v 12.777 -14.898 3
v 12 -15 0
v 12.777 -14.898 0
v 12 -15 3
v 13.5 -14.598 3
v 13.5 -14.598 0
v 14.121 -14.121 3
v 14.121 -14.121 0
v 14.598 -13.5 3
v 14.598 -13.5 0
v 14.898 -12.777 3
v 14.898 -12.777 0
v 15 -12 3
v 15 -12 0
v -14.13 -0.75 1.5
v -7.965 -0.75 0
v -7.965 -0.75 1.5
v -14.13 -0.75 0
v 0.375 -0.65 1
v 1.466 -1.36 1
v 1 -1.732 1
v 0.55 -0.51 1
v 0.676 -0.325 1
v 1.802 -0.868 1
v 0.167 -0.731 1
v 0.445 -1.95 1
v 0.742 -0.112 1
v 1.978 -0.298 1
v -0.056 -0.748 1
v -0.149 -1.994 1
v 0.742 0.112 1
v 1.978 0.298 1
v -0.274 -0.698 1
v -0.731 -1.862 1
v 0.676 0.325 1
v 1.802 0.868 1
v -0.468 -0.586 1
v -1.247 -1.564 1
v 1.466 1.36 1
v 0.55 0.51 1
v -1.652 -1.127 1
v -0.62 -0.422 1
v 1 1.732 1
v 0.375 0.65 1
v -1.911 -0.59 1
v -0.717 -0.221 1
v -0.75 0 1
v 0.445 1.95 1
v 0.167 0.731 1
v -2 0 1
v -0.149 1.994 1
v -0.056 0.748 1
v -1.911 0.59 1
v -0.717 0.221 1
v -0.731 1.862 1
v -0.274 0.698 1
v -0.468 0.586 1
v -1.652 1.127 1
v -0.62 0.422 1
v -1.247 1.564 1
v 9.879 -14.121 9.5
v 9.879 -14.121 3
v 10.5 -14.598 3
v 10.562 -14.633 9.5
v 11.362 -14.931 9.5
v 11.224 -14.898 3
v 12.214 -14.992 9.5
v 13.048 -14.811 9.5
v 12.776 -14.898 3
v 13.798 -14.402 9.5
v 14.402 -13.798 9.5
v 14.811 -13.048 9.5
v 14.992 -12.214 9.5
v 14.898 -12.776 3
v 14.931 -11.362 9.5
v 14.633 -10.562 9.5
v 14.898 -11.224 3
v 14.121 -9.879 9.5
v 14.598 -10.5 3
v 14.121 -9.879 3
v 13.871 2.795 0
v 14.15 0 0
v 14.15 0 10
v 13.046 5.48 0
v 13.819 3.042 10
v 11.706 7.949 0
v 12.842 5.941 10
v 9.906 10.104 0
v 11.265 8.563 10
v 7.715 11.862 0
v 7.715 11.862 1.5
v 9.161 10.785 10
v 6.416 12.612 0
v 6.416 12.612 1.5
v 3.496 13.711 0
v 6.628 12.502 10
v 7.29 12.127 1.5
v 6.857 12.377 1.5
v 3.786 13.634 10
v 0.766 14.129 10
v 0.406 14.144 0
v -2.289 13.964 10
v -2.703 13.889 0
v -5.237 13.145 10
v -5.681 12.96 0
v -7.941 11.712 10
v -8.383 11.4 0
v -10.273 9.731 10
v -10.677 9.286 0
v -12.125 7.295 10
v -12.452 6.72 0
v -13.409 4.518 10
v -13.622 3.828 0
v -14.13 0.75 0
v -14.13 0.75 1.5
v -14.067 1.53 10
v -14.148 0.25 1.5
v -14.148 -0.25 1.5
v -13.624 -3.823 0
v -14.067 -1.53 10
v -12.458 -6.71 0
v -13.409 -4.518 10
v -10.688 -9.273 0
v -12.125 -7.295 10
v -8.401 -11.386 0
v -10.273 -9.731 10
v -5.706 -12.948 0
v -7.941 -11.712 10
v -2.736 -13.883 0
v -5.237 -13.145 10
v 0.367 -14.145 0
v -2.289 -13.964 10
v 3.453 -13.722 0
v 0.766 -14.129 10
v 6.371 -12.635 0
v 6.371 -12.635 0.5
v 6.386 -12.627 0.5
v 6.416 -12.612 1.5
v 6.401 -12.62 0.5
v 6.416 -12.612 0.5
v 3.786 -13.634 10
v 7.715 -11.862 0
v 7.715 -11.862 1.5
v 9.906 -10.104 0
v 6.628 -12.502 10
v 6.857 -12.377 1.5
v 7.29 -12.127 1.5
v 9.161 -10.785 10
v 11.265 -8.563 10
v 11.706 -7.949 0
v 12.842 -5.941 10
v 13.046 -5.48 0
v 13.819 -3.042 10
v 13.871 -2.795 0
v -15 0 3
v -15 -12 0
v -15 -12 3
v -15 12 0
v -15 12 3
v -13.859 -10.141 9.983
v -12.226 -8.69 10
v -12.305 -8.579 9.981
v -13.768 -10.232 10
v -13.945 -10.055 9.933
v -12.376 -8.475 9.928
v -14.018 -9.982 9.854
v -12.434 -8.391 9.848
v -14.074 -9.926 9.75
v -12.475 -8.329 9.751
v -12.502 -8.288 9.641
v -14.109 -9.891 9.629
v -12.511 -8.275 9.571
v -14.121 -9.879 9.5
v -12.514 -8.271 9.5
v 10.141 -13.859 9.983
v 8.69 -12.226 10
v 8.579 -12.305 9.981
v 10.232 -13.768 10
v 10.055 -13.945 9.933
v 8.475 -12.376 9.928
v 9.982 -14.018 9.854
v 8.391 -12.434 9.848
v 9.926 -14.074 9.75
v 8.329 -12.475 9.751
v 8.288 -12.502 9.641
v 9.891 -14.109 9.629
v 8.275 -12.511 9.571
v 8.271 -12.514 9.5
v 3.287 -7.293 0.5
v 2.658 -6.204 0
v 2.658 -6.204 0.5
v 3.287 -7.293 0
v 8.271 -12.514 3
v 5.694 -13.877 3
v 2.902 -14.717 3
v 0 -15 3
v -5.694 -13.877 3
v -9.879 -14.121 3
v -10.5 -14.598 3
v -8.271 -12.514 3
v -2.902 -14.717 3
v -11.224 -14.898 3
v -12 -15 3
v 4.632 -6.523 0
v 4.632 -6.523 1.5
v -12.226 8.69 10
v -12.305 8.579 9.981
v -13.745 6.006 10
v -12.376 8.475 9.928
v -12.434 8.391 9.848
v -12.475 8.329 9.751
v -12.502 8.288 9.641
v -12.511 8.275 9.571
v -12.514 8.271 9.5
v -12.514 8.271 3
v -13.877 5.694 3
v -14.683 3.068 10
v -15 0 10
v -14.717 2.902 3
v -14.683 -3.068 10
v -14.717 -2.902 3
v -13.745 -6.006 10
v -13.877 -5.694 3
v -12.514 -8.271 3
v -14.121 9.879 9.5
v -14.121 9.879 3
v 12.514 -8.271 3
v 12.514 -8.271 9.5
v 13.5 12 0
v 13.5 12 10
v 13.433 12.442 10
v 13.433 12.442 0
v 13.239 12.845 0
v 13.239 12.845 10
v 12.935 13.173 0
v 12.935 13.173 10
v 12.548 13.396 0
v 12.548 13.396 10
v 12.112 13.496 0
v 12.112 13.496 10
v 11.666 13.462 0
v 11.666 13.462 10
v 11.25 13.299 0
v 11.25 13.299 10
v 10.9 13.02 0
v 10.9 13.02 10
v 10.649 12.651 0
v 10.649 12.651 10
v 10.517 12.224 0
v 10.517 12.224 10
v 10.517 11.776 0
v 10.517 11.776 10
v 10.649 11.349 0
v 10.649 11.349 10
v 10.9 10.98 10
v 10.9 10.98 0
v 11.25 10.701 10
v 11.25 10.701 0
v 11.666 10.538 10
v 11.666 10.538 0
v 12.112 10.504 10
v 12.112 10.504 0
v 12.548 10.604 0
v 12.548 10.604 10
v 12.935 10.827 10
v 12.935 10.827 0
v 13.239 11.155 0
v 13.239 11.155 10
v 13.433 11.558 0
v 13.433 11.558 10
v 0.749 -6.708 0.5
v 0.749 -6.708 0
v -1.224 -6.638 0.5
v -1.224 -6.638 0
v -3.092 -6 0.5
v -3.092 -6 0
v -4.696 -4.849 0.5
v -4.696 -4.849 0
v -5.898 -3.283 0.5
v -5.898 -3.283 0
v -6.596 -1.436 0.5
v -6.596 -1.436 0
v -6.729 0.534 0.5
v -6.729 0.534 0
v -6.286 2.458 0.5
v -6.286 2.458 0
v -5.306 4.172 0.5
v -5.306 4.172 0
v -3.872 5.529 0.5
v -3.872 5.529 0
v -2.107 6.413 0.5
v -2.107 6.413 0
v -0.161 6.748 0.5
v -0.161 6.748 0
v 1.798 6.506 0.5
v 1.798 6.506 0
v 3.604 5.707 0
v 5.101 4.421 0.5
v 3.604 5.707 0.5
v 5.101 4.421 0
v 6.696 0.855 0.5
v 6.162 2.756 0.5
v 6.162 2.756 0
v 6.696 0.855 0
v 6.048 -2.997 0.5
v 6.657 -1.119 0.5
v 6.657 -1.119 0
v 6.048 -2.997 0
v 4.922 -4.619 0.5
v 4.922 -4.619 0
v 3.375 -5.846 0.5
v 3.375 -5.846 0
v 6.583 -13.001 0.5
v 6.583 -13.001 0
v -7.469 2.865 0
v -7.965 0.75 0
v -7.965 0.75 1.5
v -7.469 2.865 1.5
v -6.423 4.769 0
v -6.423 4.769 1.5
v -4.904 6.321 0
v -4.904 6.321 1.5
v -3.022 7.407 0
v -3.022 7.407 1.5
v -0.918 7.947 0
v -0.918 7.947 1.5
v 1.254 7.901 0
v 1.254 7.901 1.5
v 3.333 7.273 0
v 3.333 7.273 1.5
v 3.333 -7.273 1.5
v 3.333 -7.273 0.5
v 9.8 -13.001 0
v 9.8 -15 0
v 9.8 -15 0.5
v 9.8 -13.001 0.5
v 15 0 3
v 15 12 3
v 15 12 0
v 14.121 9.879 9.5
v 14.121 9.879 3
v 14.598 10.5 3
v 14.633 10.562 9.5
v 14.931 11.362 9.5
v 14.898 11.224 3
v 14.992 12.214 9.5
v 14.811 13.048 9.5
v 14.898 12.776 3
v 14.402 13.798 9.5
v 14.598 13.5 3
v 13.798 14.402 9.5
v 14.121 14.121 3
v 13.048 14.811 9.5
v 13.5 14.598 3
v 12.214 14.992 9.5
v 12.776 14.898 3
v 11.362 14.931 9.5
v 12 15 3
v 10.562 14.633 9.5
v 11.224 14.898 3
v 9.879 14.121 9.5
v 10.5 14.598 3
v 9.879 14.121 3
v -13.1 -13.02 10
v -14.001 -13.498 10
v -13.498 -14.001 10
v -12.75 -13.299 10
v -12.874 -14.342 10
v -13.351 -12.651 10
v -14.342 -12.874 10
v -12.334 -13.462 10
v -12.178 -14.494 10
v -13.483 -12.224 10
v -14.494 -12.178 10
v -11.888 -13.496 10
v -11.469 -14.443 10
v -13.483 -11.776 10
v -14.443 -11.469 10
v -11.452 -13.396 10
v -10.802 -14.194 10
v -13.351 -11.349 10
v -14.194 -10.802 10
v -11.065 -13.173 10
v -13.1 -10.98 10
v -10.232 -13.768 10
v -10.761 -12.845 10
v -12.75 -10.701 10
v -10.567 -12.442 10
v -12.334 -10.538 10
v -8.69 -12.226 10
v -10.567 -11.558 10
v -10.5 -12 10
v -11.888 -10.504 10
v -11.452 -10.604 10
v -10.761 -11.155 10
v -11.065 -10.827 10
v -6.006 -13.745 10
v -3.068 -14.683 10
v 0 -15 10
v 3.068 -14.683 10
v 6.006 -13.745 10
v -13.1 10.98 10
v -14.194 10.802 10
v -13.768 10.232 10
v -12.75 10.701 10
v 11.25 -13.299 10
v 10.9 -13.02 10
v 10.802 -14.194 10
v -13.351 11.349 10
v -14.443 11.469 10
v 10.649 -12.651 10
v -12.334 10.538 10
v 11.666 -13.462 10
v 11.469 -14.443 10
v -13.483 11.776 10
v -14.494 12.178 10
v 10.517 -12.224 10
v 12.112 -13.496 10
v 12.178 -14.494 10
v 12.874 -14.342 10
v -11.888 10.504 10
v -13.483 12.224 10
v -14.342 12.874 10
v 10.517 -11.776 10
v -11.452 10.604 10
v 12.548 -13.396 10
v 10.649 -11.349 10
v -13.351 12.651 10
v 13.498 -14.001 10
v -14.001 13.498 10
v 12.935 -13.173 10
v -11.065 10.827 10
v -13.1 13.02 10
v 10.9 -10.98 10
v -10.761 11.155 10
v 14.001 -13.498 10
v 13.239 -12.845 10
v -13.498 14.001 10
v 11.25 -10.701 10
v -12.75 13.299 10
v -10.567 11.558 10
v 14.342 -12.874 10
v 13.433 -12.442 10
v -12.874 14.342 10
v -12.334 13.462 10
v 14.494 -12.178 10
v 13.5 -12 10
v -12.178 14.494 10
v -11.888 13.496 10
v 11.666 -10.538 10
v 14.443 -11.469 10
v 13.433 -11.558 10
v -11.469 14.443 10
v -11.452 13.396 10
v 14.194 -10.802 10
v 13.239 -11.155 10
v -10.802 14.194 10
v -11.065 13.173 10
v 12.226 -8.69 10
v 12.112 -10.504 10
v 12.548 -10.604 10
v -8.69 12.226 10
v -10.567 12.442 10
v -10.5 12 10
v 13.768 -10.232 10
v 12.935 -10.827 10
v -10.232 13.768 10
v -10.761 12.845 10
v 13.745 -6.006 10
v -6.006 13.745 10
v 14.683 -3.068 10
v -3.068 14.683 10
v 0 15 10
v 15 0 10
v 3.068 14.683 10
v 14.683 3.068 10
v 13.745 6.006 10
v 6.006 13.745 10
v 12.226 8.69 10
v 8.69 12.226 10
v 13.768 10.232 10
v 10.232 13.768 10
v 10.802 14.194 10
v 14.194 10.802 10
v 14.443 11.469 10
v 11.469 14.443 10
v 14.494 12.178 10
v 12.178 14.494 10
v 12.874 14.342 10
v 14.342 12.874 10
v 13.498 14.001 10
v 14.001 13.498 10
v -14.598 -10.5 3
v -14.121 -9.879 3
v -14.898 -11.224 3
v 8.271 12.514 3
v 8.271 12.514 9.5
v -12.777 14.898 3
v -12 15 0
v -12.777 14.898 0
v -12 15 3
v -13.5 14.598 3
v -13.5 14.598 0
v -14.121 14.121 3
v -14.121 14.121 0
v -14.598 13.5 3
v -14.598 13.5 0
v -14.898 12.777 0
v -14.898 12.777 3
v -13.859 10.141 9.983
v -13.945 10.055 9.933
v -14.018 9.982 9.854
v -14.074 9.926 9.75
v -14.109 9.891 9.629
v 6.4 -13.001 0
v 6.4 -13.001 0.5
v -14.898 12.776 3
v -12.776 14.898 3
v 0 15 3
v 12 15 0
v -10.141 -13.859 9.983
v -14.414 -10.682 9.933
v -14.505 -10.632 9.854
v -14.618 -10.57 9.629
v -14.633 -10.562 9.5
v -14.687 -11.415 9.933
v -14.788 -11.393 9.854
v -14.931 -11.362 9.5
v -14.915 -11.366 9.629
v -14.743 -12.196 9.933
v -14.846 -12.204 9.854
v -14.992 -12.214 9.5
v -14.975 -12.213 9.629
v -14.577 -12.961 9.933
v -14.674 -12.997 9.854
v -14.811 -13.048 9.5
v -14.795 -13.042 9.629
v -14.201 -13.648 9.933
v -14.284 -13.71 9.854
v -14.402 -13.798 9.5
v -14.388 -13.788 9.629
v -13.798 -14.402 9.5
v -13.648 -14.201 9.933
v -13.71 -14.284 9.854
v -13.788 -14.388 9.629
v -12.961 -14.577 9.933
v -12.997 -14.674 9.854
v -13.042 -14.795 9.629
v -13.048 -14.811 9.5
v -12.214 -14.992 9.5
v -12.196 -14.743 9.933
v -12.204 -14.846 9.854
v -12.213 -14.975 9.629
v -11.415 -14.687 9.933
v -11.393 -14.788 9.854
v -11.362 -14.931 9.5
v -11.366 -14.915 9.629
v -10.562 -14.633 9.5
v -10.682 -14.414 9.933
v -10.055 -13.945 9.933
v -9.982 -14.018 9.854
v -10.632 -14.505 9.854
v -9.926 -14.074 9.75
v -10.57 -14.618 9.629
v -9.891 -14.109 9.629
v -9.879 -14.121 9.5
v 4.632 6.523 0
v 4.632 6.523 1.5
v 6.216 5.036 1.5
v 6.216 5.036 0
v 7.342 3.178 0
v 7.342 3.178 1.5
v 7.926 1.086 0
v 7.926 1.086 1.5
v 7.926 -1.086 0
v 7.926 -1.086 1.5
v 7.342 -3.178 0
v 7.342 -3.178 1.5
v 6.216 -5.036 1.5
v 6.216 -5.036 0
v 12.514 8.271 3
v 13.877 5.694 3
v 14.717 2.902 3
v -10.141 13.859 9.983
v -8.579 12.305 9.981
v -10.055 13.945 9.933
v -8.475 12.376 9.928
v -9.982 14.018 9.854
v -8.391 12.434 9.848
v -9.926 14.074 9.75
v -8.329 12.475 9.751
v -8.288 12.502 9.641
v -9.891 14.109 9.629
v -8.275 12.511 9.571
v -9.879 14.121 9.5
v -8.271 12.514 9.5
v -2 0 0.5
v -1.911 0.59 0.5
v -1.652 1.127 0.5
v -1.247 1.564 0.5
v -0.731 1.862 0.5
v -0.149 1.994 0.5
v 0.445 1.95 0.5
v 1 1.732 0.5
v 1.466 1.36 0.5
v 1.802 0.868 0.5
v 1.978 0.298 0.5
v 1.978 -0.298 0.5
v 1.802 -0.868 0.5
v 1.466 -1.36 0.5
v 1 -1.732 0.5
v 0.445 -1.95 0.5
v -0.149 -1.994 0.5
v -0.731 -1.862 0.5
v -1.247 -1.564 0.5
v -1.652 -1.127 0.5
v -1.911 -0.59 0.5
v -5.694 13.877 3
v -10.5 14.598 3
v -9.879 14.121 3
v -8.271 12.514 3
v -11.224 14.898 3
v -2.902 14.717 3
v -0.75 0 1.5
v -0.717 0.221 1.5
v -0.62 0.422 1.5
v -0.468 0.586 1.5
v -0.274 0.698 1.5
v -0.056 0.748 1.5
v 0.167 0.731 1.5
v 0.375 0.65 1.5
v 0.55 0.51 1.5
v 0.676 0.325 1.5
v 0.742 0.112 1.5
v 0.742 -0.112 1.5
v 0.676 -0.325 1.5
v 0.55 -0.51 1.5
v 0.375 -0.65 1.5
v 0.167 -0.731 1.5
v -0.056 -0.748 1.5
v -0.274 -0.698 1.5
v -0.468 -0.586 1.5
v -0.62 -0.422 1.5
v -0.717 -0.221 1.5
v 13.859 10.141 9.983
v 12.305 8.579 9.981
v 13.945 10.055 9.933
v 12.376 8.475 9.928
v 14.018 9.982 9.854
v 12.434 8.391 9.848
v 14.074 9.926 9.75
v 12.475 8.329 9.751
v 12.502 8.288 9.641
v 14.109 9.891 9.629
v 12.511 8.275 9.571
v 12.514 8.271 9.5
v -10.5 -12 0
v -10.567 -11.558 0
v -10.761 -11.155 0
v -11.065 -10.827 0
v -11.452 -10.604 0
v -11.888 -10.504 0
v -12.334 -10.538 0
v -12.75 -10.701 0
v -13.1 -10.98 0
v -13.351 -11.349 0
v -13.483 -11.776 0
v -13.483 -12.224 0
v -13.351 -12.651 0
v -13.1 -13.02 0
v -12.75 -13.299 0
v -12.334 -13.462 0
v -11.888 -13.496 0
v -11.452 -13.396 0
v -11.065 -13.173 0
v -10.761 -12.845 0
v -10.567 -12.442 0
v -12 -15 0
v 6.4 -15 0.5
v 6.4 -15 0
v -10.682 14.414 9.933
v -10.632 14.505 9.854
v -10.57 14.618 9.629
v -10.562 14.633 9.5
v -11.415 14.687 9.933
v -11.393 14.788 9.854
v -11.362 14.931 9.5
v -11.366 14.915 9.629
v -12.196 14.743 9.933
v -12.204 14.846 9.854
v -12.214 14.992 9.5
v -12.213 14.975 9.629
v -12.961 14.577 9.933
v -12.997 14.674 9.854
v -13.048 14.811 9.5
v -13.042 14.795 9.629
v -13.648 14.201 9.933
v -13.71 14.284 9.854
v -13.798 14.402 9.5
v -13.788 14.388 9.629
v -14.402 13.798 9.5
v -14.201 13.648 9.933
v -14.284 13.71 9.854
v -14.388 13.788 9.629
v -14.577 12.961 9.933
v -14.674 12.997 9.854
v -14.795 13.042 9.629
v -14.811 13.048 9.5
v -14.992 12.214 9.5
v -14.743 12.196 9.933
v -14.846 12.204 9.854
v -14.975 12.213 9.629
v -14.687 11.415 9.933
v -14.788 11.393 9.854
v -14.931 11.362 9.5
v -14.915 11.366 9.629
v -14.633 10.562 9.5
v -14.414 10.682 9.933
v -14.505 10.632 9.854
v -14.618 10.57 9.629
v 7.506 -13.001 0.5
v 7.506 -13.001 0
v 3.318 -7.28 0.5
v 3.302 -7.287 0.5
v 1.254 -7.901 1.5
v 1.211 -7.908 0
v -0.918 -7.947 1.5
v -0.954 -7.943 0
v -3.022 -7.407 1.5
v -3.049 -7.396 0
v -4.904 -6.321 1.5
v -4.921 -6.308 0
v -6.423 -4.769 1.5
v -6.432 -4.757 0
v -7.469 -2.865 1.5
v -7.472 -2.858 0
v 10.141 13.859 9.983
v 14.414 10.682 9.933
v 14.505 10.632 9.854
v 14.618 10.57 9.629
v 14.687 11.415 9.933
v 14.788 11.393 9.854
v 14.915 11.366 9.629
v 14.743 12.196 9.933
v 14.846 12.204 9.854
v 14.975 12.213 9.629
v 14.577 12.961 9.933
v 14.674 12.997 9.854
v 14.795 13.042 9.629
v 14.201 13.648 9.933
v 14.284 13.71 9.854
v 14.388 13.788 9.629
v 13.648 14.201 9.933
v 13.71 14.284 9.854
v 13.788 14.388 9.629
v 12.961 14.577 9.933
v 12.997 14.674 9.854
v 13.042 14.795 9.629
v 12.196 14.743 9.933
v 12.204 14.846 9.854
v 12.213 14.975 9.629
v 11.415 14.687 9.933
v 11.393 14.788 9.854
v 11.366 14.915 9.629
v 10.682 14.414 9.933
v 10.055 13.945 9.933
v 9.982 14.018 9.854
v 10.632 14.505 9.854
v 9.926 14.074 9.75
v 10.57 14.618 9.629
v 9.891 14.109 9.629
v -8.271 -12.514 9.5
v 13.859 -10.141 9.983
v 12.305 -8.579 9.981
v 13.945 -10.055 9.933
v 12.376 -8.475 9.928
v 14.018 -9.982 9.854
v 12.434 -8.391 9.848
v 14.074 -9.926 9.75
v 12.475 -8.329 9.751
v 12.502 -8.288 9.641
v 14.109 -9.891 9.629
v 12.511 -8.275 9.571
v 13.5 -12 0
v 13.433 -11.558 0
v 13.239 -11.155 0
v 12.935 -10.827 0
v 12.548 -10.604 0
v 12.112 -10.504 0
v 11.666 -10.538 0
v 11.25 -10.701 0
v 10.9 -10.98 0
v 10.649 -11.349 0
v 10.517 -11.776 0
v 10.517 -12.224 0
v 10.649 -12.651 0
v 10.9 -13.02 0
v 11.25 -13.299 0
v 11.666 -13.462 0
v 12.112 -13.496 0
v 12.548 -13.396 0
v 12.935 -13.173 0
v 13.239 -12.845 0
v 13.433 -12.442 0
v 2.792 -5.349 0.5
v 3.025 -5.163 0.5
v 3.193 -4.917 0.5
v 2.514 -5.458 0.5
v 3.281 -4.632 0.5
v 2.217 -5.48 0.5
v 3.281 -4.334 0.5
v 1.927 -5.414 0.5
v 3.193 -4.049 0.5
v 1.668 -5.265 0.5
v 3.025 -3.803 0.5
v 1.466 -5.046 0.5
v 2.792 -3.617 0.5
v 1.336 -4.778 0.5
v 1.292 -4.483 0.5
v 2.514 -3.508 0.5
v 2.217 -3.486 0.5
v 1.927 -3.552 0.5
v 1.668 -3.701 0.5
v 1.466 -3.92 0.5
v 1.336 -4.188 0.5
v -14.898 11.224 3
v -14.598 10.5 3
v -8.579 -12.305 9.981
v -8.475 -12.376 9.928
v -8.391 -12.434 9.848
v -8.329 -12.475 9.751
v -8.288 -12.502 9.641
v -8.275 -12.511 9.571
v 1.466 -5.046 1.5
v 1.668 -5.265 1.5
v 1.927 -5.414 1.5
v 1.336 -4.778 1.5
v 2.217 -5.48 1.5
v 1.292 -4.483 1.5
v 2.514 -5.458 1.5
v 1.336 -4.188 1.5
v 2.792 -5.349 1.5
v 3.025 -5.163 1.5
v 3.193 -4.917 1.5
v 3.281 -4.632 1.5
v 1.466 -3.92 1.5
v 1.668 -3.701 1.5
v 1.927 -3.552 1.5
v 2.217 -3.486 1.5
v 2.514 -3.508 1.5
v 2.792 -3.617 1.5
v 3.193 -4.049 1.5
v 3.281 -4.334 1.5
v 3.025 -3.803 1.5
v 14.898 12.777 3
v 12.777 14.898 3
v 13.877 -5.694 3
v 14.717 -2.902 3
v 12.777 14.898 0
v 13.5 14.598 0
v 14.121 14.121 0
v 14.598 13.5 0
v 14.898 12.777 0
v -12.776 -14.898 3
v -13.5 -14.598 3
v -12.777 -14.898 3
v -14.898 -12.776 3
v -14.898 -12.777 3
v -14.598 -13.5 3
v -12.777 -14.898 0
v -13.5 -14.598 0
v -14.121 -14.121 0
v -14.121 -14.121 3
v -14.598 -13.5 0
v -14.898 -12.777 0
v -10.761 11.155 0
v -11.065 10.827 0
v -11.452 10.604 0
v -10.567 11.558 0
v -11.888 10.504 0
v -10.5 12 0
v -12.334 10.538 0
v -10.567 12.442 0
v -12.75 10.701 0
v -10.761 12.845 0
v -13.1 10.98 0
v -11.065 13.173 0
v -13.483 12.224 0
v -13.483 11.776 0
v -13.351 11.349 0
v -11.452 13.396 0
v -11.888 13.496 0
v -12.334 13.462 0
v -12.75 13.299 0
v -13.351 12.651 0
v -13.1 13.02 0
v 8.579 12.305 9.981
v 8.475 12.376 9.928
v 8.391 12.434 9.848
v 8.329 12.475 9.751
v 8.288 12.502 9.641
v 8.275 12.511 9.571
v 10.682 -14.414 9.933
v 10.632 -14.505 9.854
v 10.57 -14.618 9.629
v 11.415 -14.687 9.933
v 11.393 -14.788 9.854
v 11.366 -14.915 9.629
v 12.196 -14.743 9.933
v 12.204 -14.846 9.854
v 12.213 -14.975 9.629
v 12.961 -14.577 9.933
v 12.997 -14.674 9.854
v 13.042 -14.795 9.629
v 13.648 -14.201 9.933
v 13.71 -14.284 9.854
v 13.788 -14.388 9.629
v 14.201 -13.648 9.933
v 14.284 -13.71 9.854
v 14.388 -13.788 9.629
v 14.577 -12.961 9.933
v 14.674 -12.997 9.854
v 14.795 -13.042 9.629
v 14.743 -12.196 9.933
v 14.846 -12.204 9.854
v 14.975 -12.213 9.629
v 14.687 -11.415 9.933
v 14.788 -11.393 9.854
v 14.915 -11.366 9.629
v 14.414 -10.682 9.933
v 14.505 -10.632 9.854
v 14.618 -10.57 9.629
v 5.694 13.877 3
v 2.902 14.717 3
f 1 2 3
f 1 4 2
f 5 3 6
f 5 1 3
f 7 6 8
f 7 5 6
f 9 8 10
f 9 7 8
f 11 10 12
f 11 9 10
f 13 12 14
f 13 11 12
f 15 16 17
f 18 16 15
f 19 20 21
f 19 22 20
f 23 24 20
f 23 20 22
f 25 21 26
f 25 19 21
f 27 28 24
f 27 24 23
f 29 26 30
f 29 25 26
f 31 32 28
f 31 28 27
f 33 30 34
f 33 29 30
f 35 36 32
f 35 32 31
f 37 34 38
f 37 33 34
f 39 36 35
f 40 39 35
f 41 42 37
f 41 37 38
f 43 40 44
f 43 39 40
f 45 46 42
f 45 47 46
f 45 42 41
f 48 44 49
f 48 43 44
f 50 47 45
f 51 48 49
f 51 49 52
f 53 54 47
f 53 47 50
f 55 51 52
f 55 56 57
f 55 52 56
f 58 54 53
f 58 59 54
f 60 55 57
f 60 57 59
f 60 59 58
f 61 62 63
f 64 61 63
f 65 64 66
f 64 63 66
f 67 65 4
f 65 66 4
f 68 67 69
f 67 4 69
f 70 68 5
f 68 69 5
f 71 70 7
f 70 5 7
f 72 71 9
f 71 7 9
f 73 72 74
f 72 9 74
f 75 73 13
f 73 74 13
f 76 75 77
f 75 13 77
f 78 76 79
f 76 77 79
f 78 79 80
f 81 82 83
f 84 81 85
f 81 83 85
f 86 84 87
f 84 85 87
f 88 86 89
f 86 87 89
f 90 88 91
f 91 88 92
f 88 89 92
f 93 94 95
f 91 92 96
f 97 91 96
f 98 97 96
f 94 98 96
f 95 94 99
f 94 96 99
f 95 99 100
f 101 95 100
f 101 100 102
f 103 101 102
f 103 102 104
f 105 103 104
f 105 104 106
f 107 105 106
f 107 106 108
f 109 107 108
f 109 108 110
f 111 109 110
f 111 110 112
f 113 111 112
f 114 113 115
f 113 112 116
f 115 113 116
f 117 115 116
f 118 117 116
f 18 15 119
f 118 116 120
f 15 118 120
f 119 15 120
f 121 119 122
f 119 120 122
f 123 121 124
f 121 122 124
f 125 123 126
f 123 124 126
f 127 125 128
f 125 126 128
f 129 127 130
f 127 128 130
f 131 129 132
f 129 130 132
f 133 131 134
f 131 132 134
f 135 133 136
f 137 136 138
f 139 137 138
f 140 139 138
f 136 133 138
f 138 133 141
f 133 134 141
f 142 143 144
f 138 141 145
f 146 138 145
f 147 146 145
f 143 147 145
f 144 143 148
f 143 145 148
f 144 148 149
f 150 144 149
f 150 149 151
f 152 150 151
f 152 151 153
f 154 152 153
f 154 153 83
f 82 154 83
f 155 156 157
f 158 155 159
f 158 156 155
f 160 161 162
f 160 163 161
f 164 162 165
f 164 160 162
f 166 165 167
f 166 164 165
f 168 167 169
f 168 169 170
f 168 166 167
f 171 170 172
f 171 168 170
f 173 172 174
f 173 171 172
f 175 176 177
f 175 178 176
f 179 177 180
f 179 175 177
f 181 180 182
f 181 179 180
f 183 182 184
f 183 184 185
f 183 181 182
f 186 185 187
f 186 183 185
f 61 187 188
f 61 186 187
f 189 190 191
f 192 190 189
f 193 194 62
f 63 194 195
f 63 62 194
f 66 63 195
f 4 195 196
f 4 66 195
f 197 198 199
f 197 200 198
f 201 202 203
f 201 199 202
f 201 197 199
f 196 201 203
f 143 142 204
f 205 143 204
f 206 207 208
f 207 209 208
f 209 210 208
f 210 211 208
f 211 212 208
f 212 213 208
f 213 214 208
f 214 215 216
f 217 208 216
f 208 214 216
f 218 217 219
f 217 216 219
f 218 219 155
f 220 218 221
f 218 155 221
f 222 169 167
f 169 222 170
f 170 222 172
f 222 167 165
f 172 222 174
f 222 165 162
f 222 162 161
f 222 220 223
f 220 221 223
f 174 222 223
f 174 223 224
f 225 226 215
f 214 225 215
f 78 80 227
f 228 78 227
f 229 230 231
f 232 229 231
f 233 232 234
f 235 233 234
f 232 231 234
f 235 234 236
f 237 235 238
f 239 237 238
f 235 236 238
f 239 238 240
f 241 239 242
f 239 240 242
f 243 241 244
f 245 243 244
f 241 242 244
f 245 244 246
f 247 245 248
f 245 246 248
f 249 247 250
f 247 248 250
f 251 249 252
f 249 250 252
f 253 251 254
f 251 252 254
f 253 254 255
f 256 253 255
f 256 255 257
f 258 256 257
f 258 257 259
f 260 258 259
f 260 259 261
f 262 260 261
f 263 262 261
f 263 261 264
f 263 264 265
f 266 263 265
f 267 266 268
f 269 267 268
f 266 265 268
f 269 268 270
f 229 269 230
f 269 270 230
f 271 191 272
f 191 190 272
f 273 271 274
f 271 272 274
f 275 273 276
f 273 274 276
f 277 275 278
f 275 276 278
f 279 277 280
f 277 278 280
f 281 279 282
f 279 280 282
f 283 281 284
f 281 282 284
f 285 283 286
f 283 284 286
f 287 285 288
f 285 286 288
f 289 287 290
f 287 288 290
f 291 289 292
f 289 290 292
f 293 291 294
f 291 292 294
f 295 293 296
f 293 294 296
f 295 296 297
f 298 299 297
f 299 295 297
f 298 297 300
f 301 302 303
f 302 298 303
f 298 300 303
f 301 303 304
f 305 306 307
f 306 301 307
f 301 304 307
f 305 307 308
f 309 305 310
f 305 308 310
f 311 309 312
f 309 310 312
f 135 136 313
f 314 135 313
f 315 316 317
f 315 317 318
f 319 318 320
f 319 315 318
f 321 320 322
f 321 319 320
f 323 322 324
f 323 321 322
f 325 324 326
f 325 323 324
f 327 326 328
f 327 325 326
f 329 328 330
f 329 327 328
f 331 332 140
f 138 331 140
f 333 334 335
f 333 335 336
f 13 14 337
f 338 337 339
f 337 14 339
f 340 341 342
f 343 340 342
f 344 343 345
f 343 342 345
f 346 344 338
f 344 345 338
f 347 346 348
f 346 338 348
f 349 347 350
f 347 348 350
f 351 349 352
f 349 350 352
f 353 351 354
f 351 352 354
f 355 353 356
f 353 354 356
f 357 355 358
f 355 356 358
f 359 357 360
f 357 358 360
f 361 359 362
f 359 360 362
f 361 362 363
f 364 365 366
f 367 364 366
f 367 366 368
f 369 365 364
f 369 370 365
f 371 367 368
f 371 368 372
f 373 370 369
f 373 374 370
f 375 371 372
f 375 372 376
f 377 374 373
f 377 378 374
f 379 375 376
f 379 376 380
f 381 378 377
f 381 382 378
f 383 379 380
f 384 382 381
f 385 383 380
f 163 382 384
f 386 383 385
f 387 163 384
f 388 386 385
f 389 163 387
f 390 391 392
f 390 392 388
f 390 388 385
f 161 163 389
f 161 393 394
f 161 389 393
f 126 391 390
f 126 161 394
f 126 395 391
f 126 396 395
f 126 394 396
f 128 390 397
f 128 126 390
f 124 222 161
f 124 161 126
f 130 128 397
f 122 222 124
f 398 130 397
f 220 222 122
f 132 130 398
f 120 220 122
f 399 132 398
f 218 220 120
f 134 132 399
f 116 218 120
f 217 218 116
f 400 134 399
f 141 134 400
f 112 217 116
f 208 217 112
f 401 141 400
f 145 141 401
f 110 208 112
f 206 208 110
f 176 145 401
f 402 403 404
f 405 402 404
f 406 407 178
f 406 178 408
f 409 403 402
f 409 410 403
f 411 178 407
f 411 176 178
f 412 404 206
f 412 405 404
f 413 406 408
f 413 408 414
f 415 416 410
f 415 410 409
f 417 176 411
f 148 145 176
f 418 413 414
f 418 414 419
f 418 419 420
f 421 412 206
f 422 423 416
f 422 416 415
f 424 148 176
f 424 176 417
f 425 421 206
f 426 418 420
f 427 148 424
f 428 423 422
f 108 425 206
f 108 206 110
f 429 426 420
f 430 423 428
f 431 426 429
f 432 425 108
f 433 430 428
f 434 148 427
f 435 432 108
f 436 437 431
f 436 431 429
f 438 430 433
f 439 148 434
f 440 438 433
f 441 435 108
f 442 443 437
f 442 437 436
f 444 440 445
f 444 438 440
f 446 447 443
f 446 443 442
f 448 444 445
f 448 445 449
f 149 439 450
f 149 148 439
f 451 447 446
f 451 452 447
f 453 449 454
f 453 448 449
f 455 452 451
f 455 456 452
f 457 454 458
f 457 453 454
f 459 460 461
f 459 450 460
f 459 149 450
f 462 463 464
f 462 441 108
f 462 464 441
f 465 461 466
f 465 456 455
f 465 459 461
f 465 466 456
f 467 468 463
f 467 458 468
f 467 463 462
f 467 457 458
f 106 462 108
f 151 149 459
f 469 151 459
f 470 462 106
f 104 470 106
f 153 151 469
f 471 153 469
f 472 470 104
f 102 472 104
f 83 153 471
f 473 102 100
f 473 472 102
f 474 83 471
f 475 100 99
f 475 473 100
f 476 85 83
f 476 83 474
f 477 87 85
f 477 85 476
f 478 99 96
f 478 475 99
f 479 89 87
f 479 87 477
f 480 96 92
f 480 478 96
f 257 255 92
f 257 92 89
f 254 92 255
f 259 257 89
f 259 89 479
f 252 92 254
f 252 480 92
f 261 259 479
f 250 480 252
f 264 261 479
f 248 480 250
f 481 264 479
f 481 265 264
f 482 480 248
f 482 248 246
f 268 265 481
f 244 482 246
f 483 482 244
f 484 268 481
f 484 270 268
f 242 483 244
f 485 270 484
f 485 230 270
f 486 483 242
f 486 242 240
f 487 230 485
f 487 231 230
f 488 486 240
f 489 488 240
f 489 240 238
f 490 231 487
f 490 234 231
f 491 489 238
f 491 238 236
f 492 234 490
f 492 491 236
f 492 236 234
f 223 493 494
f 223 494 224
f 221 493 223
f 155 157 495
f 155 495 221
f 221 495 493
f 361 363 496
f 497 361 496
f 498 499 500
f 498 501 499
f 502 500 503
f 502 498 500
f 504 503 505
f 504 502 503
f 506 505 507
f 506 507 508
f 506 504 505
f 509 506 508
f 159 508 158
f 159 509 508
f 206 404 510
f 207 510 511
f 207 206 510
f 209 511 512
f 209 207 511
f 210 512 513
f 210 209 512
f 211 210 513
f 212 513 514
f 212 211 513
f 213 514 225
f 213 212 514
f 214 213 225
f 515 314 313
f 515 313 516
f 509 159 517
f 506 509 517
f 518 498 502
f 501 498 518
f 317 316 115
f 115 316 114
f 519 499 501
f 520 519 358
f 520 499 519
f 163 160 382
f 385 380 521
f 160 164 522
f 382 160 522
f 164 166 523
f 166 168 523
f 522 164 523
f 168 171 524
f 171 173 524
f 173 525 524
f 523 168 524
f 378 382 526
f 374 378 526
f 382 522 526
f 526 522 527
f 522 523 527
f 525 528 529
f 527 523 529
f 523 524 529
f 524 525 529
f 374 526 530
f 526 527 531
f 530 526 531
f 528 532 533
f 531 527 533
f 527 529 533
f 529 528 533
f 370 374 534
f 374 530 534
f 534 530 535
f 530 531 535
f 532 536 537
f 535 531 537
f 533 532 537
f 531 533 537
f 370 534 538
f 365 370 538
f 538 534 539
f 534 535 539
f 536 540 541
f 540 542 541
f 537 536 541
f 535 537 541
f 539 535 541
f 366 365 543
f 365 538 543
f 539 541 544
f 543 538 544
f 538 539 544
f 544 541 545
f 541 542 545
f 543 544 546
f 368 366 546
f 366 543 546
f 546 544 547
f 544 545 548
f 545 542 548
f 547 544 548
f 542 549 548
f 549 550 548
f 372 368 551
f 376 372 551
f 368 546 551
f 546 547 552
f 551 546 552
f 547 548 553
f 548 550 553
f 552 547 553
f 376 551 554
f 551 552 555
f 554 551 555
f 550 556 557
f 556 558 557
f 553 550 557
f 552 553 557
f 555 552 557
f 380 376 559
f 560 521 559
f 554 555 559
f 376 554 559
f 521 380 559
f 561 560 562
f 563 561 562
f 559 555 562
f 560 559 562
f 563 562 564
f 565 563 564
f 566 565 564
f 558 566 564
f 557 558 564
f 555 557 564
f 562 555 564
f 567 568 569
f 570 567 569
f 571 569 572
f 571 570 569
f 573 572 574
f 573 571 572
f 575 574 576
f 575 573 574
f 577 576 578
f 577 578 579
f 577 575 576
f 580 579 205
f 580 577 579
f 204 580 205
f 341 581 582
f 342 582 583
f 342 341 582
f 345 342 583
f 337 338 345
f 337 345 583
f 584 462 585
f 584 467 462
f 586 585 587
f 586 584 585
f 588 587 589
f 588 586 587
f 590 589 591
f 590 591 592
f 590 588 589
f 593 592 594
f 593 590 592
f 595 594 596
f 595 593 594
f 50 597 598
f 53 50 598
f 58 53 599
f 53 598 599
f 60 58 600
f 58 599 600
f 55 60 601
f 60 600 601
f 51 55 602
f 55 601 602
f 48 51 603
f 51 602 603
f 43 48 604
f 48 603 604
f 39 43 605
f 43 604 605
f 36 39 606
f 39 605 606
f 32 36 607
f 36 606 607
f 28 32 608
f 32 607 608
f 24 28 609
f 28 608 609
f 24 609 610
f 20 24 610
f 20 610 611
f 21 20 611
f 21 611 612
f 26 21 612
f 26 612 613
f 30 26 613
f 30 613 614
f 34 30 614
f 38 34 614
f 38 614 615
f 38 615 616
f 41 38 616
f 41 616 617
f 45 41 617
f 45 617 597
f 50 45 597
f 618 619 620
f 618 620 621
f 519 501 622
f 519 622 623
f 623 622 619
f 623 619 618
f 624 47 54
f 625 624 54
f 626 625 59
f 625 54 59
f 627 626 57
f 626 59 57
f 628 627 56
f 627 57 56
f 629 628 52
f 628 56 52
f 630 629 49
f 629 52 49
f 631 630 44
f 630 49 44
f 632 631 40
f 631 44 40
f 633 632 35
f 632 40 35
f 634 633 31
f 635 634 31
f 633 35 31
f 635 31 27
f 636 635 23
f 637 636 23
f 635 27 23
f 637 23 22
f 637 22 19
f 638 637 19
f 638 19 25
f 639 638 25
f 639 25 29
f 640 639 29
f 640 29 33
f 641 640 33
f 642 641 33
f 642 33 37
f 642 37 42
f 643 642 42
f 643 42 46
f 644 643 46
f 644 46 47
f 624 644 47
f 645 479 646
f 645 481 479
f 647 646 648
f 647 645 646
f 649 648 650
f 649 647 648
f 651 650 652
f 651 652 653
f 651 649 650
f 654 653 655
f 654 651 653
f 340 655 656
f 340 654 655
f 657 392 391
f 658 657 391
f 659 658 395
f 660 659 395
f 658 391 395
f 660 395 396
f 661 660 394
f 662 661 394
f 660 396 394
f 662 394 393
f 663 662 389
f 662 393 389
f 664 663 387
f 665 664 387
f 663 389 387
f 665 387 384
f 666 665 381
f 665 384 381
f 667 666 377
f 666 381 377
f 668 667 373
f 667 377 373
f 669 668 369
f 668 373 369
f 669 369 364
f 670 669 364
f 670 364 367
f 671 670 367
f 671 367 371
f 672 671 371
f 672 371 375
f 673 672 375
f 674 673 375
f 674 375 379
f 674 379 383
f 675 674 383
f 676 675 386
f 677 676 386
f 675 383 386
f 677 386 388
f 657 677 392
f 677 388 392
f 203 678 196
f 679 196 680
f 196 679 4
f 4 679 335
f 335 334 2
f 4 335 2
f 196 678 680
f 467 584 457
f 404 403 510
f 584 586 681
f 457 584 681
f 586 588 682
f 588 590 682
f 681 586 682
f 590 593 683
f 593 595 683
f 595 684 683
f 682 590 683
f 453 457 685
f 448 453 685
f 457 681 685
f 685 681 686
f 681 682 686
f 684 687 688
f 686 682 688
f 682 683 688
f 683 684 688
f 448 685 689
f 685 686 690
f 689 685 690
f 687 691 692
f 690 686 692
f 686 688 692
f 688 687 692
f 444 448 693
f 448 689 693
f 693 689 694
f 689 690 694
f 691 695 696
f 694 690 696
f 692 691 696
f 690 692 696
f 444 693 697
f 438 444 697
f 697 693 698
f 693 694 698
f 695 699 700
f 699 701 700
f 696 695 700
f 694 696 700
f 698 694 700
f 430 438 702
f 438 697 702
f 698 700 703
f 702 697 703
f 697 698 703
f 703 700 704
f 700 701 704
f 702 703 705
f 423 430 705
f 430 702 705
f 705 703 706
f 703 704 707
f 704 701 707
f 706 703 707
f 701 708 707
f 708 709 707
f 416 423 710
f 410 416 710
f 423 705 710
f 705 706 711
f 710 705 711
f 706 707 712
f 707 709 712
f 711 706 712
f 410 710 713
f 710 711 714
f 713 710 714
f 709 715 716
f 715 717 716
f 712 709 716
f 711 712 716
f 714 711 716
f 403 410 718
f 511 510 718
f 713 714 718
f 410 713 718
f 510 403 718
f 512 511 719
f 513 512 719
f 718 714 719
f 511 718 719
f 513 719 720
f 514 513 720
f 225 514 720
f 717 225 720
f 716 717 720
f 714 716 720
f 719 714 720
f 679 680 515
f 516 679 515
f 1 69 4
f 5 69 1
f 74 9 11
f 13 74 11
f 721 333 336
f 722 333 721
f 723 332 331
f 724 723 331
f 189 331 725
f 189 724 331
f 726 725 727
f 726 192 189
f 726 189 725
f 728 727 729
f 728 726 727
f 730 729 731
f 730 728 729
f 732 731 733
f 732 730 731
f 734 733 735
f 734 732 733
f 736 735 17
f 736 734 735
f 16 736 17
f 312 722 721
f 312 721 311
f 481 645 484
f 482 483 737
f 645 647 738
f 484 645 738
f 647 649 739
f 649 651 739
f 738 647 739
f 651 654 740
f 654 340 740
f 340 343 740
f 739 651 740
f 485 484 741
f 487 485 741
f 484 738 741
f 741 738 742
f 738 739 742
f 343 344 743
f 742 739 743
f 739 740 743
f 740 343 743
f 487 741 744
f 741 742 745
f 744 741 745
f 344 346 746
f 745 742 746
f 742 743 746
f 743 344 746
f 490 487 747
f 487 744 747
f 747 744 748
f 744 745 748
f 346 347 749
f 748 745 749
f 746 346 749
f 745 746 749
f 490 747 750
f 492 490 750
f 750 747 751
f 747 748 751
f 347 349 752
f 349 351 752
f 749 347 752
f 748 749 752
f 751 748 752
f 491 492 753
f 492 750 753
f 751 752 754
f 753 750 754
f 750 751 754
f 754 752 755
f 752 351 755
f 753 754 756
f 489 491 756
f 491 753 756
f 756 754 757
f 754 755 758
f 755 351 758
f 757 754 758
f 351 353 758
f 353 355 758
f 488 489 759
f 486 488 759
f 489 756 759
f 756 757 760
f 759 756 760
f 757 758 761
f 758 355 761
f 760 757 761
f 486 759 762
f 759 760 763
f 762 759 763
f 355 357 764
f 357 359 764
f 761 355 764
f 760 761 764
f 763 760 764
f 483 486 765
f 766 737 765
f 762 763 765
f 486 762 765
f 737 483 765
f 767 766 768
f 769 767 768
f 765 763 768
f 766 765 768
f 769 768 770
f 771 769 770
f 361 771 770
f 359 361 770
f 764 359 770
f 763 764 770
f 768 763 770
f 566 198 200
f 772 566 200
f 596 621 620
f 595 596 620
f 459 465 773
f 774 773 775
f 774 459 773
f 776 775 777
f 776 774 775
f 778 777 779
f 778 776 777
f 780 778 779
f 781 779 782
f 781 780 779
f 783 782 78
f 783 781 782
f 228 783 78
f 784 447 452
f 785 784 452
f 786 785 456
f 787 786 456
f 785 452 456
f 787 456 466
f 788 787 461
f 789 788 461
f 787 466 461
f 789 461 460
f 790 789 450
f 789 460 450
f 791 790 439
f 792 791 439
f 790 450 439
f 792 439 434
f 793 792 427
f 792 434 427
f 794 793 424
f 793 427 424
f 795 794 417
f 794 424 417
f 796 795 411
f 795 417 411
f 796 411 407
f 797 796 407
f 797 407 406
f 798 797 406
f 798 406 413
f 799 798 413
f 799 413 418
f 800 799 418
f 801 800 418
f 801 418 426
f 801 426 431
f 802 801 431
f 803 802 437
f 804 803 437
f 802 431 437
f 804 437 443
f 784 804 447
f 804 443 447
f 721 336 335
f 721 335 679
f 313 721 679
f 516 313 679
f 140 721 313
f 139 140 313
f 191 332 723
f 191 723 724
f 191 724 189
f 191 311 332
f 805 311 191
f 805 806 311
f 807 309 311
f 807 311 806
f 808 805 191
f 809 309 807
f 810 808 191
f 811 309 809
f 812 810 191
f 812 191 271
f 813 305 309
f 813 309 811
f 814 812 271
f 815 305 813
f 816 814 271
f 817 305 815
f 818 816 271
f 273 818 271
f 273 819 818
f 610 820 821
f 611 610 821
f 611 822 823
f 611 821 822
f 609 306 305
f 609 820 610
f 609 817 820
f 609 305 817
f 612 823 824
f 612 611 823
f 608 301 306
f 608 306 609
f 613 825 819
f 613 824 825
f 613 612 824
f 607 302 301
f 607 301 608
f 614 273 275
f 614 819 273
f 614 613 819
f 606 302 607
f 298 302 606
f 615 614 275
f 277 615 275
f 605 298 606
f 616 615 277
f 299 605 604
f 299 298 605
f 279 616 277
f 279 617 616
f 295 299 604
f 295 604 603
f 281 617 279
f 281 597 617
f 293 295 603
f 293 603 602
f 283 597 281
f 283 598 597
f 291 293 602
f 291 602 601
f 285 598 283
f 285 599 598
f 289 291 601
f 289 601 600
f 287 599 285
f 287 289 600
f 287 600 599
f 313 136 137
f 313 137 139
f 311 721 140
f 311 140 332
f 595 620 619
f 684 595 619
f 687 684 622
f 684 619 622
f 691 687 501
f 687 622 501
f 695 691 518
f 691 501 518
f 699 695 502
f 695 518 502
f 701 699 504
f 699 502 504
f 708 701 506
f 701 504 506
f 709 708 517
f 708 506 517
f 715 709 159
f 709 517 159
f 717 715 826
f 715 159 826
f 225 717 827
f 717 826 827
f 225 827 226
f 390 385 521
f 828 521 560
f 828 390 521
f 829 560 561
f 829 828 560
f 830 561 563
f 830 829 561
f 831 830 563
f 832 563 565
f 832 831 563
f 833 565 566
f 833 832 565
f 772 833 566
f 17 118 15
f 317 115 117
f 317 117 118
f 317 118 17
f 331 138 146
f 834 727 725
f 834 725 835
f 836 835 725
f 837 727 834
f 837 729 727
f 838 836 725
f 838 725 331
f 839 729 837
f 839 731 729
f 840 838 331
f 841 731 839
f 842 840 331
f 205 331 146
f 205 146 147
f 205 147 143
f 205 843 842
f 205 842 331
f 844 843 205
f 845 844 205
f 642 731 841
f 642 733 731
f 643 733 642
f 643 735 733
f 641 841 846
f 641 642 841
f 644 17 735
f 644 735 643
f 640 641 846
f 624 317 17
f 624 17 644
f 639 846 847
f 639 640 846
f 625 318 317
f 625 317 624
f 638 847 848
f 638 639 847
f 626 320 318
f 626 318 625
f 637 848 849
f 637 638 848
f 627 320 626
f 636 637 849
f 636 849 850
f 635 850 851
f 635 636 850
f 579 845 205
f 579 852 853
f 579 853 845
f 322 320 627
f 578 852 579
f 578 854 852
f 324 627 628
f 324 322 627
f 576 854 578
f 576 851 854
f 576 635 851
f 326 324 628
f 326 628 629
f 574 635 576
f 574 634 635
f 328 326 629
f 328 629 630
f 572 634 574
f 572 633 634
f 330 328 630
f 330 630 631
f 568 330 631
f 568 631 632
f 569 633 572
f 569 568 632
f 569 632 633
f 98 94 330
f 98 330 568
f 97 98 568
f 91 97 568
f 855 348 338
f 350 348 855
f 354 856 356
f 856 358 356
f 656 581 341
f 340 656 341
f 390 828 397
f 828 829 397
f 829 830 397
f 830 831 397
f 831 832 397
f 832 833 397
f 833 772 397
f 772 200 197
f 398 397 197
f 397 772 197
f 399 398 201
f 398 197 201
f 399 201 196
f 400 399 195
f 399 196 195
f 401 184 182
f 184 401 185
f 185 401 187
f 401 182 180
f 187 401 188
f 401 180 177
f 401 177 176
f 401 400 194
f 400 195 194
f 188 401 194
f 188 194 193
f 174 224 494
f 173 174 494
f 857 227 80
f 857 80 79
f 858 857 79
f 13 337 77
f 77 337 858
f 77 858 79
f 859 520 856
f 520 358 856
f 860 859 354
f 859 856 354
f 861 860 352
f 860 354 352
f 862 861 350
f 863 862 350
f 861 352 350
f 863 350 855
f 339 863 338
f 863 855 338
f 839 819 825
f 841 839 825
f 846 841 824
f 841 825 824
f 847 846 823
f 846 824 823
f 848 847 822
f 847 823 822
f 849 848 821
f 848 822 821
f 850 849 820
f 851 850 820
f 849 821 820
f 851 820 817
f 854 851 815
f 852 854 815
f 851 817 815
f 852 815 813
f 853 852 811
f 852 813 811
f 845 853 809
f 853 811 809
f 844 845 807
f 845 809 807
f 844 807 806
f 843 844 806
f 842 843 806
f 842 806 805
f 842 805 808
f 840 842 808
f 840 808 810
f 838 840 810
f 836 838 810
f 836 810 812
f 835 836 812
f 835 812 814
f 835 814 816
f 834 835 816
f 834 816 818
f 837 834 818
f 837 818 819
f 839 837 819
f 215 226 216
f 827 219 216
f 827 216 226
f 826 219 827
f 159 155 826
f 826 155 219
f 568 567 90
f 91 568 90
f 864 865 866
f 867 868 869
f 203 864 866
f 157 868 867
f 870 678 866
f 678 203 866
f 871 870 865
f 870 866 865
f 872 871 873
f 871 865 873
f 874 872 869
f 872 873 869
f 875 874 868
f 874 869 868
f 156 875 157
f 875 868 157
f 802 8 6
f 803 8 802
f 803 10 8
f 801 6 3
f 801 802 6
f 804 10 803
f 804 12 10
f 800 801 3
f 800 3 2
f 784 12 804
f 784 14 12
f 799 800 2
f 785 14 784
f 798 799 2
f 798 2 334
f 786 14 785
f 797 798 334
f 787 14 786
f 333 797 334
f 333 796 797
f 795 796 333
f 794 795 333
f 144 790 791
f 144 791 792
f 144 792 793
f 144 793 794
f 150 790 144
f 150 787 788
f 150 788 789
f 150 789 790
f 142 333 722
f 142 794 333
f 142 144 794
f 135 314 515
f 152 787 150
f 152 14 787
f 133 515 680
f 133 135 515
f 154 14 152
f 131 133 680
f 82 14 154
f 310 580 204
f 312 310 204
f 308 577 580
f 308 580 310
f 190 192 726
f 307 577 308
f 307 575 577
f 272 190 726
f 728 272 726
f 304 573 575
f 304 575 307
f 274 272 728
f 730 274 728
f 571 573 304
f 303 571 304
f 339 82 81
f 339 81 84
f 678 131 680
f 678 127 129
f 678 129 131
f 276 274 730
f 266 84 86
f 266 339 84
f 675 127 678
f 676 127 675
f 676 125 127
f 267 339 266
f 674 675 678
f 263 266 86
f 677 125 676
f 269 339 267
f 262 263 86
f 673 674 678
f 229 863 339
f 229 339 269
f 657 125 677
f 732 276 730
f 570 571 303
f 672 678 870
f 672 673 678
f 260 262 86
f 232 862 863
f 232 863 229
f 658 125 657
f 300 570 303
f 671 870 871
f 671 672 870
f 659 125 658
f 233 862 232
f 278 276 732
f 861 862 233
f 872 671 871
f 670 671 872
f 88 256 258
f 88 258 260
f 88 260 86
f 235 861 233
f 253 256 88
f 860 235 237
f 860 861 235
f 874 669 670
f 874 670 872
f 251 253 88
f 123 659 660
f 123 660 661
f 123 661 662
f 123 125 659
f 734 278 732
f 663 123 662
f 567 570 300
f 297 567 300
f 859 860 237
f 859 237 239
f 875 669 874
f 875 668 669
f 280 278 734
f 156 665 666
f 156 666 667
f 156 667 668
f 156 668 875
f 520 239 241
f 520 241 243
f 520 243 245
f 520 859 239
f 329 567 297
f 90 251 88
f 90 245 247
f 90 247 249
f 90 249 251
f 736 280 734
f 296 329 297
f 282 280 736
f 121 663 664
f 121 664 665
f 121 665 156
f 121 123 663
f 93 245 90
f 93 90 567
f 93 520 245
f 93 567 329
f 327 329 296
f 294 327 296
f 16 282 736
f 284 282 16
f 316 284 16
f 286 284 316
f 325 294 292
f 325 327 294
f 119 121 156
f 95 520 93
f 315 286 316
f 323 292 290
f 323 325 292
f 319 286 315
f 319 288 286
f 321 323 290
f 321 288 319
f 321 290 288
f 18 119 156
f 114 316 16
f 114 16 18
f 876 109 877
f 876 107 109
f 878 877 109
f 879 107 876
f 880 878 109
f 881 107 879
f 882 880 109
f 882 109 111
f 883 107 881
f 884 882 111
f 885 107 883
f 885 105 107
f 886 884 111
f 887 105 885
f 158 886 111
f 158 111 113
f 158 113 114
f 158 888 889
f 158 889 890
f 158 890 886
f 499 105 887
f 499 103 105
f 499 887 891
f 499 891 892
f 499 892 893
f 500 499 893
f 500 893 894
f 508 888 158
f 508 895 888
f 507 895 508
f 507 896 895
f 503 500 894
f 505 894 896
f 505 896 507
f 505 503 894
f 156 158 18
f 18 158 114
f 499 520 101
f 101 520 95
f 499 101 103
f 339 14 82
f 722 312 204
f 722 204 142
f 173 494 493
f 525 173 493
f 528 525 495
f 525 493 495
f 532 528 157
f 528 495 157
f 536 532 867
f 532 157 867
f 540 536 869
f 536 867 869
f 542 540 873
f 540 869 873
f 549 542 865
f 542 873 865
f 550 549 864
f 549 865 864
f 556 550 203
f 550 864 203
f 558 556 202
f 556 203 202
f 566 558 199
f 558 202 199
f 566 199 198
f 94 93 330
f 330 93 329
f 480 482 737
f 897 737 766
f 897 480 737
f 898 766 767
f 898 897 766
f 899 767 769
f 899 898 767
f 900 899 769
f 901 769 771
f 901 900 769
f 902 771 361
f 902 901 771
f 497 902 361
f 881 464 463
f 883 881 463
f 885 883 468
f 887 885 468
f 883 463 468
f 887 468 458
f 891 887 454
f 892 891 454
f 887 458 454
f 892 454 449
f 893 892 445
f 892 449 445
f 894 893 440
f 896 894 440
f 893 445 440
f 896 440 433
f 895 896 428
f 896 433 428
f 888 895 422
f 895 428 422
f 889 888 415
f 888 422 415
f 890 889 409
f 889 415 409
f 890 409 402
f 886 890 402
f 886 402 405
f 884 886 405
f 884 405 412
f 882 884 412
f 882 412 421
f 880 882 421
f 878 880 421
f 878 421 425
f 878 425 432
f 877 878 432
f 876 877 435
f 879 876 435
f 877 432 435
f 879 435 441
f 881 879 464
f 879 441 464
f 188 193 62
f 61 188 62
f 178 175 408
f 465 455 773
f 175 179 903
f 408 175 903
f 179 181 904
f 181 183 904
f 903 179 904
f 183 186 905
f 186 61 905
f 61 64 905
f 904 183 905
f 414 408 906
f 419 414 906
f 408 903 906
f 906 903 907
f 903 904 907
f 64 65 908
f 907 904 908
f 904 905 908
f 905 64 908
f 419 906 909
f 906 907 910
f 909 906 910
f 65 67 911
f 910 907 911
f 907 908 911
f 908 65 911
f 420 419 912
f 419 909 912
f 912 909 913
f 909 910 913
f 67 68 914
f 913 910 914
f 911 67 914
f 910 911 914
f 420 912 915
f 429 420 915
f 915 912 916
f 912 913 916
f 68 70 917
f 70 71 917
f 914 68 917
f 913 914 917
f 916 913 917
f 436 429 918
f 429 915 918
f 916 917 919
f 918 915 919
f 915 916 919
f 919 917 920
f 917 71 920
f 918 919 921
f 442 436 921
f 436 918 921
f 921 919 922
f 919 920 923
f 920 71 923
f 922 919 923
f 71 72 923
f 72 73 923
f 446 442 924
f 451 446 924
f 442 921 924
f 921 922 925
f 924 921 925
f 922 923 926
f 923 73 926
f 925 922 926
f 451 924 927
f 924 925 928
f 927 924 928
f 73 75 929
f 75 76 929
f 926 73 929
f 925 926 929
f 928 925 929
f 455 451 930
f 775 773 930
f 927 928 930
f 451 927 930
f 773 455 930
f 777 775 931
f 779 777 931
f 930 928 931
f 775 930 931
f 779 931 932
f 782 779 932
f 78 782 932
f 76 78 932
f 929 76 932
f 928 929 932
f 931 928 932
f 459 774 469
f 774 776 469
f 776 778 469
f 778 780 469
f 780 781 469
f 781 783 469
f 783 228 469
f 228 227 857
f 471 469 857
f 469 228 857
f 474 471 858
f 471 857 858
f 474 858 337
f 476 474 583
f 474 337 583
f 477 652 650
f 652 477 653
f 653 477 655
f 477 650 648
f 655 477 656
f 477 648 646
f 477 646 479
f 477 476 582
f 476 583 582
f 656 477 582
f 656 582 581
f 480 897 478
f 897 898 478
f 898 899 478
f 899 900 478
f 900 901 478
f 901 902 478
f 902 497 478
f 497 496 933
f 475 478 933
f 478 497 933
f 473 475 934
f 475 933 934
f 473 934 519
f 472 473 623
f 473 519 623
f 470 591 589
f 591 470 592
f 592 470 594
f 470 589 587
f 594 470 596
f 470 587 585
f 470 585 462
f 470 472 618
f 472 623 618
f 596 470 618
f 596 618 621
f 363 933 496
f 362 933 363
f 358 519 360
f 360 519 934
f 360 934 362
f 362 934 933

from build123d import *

# Parameters (mm, degrees)
SKETCH1_W           = 30
SKETCH1_H           = 30
BOSS_EXTRUDE1_DEPTH = 3
SKETCH2_R           = 15
BOSS_EXTRUDE2_DEPTH = 7
BOSS_EXTRUDE3_DEPTH = 7
FILLET1_R           = 3
SKETCH5_R           = 14.15
CUT_EXTRUDE2_DEPTH  = 10
SKETCH6_R           = 1.5
CUT_EXTRUDE3_DEPTH  = 10
SKETCH7_R           = 8
BOSS_EXTRUDE4_DEPTH = 1.5
SKETCH8_W           = 13.15764426
SKETCH8_H           = 1.5
BOSS_EXTRUDE5_DEPTH = 1.5
SKETCH9_R           = 0.75
CUT_EXTRUDE4_DEPTH  = 1.5
SKETCH10_R          = 2
CUT_EXTRUDE5_DEPTH  = 1
SKETCH11_R          = 6.75
CUT_EXTRUDE6_DEPTH  = 0.5
SKETCH12_W          = 3.4
SKETCH12_H          = 2.5
CUT_EXTRUDE7_DEPTH  = 0.5
CUT_EXTRUDE8_DEPTH  = 0.5
SKETCH14_R          = 1
CUT_EXTRUDE9_DEPTH  = 2
FILLET2_R           = 0.5


with BuildPart() as part:
    # Sketch1 → Boss-Extrude1 (new body)
    with BuildSketch(Plane.XY):
        Rectangle(SKETCH1_W, SKETCH1_H)
    extrude(amount=BOSS_EXTRUDE1_DEPTH)

    # Sketch2 → Boss-Extrude2 (add)
    with BuildSketch(Plane.XY.offset(3)):
        Circle(SKETCH2_R)
    extrude(amount=BOSS_EXTRUDE2_DEPTH)

    # Sketch4 → Boss-Extrude3 (add)
    with BuildSketch(Plane.XY.offset(3)):
        with BuildLine():
            Line((-14.121320344, 9.878679656), (-4.242640687, 0))
            Line((-4.242640687, 0), (-14.121320344, -9.878679656))
            ThreePointArc((-14.121320344, -9.878679656), (-14.121320344, -14.121320344), (-9.878679656, -14.121320344))
            Line((-9.878679656, -14.121320344), (0, -4.242640687))
            Line((0, -4.242640687), (9.878679656, -14.121320344))
            ThreePointArc((9.878679656, -14.121320344), (14.121320344, -14.121320344), (14.121320344, -9.878679656))
            Line((14.121320344, -9.878679656), (4.242640687, 0))
            Line((4.242640687, 0), (14.121320344, 9.878679656))
            ThreePointArc((14.121320344, 9.878679656), (14.121320344, 14.121320344), (9.878679656, 14.121320344))
            Line((9.878679656, 14.121320344), (0, 4.242640687))
            Line((0, 4.242640687), (-9.878679656, 14.121320344))
            ThreePointArc((-9.878679656, 14.121320344), (-14.121320344, 14.121320344), (-14.121320344, 9.878679656))
        make_face()
    extrude(amount=BOSS_EXTRUDE3_DEPTH)

    # Fillet1
    fillet1_edges = [part.edges().sort_by_distance(p)[0] for p in [
        (-15, -15, 1.5),
        (15, -15, 1.5),
        (15, 15, 1.5),
        (-15, 15, 1.5),
    ]]
    fillet(fillet1_edges, radius=FILLET1_R - 0.0001)  # a hair under: the kernel refuses the full size

    # Sketch5 → Cut-Extrude2 (cut)
    with BuildSketch(Plane.XY.offset(10)):
        Circle(SKETCH5_R)
    extrude(amount=-CUT_EXTRUDE2_DEPTH, mode=Mode.SUBTRACT)

    # Sketch6 → Cut-Extrude3 (cut)
    with BuildSketch(Plane.XY.offset(10)):
        with Locations((-12, 12)):
            Circle(SKETCH6_R)
        with Locations((12, 12)):
            Circle(SKETCH6_R)
        with Locations((12, -12)):
            Circle(SKETCH6_R)
        with Locations((-12, -12)):
            Circle(SKETCH6_R)
    extrude(amount=-CUT_EXTRUDE3_DEPTH, mode=Mode.SUBTRACT)



with BuildPart() as body_2:
    # Sketch7 → Boss-Extrude4 (new body)
    with BuildSketch(Plane(origin=(0, 0, 0), x_dir=(-1, 0, 0), z_dir=(0, 0, -1))):
        Circle(SKETCH7_R)
    extrude(amount=-BOSS_EXTRUDE4_DEPTH)


with BuildPart() as part_1:
    add(part.part)

    add(body_2.part)  # Boss-Extrude5 merges body 2
    # Sketch8 → Boss-Extrude5 (add)
    with BuildSketch(Plane(origin=(0, 0, 0), x_dir=(-1, 0, 0), z_dir=(0, 0, -1))):
        Polygon((-0.061069882, -1.605776139), (-6.639892012, -13.000630322), (-7.938930118, -12.250630322), (-1.360107988, -0.855776139), align=None)
        with Locations((8, 0)):
            Rectangle(SKETCH8_W, SKETCH8_H)
        Polygon((-1.360107988, 0.855776139), (-7.938930118, 12.250630322), (-6.639892012, 13.000630322), (-0.061069882, 1.605776139), align=None)
    extrude(amount=-BOSS_EXTRUDE5_DEPTH)

    # Sketch9 → Cut-Extrude4 (cut)
    with BuildSketch(Plane(origin=(0, 0, 0), x_dir=(-1, 0, 0), z_dir=(0, 0, -1))):
        Circle(SKETCH9_R)
    extrude(amount=-CUT_EXTRUDE4_DEPTH, mode=Mode.SUBTRACT)

    # Sketch10 → Cut-Extrude5 (cut)
    with BuildSketch(Plane(origin=(0, 0, 0), x_dir=(-1, 0, 0), z_dir=(0, 0, -1))):
        Circle(SKETCH10_R)
    extrude(amount=-CUT_EXTRUDE5_DEPTH, mode=Mode.SUBTRACT)

    # Sketch11 → Cut-Extrude6 (cut)
    with BuildSketch(Plane(origin=(0, 0, 0), x_dir=(-1, 0, 0), z_dir=(0, 0, -1))):
        Circle(SKETCH11_R)
    extrude(amount=-CUT_EXTRUDE6_DEPTH, mode=Mode.SUBTRACT)

    # Sketch12 → Cut-Extrude7 (cut)
    with BuildSketch(Plane(origin=(0, 0, 0), x_dir=(-1, 0, 0), z_dir=(0, 0, -1))):
        with Locations((-8.1, -14.251318629)):
            Rectangle(SKETCH12_W, SKETCH12_H)
    extrude(amount=-CUT_EXTRUDE7_DEPTH, mode=Mode.SUBTRACT)

    # Sketch13 → Cut-Extrude8 (cut)
    with BuildSketch(Plane(origin=(0, 0, 0), x_dir=(-1, 0, 0), z_dir=(0, 0, -1))):
        Polygon((-1.799060557, -4.71606429), (-6.993041412, -13.712303025), (-7.685861735, -13.312303025), (-2.49188088, -4.31606429), align=None)
    extrude(amount=-CUT_EXTRUDE8_DEPTH, mode=Mode.SUBTRACT)

    # Sketch14 → Cut-Extrude9 (cut)
    with BuildSketch(Plane(origin=(0, 0, 0.5), x_dir=(-1, 0, 0), z_dir=(0, 0, -1))):
        with Locations((-2.291903498, -4.48287736)):
            Circle(SKETCH14_R)
    extrude(amount=-CUT_EXTRUDE9_DEPTH, mode=Mode.SUBTRACT)

    # Fillet2
    fillet2_edges = [part_1.edges().sort_by_distance(p)[0] for p in [
        (13.317472766, 9.074832079, 10),
        (14.121320344, 14.121320344, 10),
        (9.074832079, 13.317472766, 10),
        (-9.074832079, 13.317472766, 10),
        (-14.121320344, 14.121320344, 10),
        (-13.317472766, 9.074832079, 10),
        (-13.317472766, -9.074832079, 10),
        (-14.121320344, -14.121320344, 10),
        (-9.074832079, -13.317472766, 10),
        (9.074832079, -13.317472766, 10),
        (14.121320344, -14.121320344, 10),
        (13.317472766, -9.074832079, 10),
    ]]
    fillet(fillet2_edges, radius=FILLET2_R)


solid = part_1.part
